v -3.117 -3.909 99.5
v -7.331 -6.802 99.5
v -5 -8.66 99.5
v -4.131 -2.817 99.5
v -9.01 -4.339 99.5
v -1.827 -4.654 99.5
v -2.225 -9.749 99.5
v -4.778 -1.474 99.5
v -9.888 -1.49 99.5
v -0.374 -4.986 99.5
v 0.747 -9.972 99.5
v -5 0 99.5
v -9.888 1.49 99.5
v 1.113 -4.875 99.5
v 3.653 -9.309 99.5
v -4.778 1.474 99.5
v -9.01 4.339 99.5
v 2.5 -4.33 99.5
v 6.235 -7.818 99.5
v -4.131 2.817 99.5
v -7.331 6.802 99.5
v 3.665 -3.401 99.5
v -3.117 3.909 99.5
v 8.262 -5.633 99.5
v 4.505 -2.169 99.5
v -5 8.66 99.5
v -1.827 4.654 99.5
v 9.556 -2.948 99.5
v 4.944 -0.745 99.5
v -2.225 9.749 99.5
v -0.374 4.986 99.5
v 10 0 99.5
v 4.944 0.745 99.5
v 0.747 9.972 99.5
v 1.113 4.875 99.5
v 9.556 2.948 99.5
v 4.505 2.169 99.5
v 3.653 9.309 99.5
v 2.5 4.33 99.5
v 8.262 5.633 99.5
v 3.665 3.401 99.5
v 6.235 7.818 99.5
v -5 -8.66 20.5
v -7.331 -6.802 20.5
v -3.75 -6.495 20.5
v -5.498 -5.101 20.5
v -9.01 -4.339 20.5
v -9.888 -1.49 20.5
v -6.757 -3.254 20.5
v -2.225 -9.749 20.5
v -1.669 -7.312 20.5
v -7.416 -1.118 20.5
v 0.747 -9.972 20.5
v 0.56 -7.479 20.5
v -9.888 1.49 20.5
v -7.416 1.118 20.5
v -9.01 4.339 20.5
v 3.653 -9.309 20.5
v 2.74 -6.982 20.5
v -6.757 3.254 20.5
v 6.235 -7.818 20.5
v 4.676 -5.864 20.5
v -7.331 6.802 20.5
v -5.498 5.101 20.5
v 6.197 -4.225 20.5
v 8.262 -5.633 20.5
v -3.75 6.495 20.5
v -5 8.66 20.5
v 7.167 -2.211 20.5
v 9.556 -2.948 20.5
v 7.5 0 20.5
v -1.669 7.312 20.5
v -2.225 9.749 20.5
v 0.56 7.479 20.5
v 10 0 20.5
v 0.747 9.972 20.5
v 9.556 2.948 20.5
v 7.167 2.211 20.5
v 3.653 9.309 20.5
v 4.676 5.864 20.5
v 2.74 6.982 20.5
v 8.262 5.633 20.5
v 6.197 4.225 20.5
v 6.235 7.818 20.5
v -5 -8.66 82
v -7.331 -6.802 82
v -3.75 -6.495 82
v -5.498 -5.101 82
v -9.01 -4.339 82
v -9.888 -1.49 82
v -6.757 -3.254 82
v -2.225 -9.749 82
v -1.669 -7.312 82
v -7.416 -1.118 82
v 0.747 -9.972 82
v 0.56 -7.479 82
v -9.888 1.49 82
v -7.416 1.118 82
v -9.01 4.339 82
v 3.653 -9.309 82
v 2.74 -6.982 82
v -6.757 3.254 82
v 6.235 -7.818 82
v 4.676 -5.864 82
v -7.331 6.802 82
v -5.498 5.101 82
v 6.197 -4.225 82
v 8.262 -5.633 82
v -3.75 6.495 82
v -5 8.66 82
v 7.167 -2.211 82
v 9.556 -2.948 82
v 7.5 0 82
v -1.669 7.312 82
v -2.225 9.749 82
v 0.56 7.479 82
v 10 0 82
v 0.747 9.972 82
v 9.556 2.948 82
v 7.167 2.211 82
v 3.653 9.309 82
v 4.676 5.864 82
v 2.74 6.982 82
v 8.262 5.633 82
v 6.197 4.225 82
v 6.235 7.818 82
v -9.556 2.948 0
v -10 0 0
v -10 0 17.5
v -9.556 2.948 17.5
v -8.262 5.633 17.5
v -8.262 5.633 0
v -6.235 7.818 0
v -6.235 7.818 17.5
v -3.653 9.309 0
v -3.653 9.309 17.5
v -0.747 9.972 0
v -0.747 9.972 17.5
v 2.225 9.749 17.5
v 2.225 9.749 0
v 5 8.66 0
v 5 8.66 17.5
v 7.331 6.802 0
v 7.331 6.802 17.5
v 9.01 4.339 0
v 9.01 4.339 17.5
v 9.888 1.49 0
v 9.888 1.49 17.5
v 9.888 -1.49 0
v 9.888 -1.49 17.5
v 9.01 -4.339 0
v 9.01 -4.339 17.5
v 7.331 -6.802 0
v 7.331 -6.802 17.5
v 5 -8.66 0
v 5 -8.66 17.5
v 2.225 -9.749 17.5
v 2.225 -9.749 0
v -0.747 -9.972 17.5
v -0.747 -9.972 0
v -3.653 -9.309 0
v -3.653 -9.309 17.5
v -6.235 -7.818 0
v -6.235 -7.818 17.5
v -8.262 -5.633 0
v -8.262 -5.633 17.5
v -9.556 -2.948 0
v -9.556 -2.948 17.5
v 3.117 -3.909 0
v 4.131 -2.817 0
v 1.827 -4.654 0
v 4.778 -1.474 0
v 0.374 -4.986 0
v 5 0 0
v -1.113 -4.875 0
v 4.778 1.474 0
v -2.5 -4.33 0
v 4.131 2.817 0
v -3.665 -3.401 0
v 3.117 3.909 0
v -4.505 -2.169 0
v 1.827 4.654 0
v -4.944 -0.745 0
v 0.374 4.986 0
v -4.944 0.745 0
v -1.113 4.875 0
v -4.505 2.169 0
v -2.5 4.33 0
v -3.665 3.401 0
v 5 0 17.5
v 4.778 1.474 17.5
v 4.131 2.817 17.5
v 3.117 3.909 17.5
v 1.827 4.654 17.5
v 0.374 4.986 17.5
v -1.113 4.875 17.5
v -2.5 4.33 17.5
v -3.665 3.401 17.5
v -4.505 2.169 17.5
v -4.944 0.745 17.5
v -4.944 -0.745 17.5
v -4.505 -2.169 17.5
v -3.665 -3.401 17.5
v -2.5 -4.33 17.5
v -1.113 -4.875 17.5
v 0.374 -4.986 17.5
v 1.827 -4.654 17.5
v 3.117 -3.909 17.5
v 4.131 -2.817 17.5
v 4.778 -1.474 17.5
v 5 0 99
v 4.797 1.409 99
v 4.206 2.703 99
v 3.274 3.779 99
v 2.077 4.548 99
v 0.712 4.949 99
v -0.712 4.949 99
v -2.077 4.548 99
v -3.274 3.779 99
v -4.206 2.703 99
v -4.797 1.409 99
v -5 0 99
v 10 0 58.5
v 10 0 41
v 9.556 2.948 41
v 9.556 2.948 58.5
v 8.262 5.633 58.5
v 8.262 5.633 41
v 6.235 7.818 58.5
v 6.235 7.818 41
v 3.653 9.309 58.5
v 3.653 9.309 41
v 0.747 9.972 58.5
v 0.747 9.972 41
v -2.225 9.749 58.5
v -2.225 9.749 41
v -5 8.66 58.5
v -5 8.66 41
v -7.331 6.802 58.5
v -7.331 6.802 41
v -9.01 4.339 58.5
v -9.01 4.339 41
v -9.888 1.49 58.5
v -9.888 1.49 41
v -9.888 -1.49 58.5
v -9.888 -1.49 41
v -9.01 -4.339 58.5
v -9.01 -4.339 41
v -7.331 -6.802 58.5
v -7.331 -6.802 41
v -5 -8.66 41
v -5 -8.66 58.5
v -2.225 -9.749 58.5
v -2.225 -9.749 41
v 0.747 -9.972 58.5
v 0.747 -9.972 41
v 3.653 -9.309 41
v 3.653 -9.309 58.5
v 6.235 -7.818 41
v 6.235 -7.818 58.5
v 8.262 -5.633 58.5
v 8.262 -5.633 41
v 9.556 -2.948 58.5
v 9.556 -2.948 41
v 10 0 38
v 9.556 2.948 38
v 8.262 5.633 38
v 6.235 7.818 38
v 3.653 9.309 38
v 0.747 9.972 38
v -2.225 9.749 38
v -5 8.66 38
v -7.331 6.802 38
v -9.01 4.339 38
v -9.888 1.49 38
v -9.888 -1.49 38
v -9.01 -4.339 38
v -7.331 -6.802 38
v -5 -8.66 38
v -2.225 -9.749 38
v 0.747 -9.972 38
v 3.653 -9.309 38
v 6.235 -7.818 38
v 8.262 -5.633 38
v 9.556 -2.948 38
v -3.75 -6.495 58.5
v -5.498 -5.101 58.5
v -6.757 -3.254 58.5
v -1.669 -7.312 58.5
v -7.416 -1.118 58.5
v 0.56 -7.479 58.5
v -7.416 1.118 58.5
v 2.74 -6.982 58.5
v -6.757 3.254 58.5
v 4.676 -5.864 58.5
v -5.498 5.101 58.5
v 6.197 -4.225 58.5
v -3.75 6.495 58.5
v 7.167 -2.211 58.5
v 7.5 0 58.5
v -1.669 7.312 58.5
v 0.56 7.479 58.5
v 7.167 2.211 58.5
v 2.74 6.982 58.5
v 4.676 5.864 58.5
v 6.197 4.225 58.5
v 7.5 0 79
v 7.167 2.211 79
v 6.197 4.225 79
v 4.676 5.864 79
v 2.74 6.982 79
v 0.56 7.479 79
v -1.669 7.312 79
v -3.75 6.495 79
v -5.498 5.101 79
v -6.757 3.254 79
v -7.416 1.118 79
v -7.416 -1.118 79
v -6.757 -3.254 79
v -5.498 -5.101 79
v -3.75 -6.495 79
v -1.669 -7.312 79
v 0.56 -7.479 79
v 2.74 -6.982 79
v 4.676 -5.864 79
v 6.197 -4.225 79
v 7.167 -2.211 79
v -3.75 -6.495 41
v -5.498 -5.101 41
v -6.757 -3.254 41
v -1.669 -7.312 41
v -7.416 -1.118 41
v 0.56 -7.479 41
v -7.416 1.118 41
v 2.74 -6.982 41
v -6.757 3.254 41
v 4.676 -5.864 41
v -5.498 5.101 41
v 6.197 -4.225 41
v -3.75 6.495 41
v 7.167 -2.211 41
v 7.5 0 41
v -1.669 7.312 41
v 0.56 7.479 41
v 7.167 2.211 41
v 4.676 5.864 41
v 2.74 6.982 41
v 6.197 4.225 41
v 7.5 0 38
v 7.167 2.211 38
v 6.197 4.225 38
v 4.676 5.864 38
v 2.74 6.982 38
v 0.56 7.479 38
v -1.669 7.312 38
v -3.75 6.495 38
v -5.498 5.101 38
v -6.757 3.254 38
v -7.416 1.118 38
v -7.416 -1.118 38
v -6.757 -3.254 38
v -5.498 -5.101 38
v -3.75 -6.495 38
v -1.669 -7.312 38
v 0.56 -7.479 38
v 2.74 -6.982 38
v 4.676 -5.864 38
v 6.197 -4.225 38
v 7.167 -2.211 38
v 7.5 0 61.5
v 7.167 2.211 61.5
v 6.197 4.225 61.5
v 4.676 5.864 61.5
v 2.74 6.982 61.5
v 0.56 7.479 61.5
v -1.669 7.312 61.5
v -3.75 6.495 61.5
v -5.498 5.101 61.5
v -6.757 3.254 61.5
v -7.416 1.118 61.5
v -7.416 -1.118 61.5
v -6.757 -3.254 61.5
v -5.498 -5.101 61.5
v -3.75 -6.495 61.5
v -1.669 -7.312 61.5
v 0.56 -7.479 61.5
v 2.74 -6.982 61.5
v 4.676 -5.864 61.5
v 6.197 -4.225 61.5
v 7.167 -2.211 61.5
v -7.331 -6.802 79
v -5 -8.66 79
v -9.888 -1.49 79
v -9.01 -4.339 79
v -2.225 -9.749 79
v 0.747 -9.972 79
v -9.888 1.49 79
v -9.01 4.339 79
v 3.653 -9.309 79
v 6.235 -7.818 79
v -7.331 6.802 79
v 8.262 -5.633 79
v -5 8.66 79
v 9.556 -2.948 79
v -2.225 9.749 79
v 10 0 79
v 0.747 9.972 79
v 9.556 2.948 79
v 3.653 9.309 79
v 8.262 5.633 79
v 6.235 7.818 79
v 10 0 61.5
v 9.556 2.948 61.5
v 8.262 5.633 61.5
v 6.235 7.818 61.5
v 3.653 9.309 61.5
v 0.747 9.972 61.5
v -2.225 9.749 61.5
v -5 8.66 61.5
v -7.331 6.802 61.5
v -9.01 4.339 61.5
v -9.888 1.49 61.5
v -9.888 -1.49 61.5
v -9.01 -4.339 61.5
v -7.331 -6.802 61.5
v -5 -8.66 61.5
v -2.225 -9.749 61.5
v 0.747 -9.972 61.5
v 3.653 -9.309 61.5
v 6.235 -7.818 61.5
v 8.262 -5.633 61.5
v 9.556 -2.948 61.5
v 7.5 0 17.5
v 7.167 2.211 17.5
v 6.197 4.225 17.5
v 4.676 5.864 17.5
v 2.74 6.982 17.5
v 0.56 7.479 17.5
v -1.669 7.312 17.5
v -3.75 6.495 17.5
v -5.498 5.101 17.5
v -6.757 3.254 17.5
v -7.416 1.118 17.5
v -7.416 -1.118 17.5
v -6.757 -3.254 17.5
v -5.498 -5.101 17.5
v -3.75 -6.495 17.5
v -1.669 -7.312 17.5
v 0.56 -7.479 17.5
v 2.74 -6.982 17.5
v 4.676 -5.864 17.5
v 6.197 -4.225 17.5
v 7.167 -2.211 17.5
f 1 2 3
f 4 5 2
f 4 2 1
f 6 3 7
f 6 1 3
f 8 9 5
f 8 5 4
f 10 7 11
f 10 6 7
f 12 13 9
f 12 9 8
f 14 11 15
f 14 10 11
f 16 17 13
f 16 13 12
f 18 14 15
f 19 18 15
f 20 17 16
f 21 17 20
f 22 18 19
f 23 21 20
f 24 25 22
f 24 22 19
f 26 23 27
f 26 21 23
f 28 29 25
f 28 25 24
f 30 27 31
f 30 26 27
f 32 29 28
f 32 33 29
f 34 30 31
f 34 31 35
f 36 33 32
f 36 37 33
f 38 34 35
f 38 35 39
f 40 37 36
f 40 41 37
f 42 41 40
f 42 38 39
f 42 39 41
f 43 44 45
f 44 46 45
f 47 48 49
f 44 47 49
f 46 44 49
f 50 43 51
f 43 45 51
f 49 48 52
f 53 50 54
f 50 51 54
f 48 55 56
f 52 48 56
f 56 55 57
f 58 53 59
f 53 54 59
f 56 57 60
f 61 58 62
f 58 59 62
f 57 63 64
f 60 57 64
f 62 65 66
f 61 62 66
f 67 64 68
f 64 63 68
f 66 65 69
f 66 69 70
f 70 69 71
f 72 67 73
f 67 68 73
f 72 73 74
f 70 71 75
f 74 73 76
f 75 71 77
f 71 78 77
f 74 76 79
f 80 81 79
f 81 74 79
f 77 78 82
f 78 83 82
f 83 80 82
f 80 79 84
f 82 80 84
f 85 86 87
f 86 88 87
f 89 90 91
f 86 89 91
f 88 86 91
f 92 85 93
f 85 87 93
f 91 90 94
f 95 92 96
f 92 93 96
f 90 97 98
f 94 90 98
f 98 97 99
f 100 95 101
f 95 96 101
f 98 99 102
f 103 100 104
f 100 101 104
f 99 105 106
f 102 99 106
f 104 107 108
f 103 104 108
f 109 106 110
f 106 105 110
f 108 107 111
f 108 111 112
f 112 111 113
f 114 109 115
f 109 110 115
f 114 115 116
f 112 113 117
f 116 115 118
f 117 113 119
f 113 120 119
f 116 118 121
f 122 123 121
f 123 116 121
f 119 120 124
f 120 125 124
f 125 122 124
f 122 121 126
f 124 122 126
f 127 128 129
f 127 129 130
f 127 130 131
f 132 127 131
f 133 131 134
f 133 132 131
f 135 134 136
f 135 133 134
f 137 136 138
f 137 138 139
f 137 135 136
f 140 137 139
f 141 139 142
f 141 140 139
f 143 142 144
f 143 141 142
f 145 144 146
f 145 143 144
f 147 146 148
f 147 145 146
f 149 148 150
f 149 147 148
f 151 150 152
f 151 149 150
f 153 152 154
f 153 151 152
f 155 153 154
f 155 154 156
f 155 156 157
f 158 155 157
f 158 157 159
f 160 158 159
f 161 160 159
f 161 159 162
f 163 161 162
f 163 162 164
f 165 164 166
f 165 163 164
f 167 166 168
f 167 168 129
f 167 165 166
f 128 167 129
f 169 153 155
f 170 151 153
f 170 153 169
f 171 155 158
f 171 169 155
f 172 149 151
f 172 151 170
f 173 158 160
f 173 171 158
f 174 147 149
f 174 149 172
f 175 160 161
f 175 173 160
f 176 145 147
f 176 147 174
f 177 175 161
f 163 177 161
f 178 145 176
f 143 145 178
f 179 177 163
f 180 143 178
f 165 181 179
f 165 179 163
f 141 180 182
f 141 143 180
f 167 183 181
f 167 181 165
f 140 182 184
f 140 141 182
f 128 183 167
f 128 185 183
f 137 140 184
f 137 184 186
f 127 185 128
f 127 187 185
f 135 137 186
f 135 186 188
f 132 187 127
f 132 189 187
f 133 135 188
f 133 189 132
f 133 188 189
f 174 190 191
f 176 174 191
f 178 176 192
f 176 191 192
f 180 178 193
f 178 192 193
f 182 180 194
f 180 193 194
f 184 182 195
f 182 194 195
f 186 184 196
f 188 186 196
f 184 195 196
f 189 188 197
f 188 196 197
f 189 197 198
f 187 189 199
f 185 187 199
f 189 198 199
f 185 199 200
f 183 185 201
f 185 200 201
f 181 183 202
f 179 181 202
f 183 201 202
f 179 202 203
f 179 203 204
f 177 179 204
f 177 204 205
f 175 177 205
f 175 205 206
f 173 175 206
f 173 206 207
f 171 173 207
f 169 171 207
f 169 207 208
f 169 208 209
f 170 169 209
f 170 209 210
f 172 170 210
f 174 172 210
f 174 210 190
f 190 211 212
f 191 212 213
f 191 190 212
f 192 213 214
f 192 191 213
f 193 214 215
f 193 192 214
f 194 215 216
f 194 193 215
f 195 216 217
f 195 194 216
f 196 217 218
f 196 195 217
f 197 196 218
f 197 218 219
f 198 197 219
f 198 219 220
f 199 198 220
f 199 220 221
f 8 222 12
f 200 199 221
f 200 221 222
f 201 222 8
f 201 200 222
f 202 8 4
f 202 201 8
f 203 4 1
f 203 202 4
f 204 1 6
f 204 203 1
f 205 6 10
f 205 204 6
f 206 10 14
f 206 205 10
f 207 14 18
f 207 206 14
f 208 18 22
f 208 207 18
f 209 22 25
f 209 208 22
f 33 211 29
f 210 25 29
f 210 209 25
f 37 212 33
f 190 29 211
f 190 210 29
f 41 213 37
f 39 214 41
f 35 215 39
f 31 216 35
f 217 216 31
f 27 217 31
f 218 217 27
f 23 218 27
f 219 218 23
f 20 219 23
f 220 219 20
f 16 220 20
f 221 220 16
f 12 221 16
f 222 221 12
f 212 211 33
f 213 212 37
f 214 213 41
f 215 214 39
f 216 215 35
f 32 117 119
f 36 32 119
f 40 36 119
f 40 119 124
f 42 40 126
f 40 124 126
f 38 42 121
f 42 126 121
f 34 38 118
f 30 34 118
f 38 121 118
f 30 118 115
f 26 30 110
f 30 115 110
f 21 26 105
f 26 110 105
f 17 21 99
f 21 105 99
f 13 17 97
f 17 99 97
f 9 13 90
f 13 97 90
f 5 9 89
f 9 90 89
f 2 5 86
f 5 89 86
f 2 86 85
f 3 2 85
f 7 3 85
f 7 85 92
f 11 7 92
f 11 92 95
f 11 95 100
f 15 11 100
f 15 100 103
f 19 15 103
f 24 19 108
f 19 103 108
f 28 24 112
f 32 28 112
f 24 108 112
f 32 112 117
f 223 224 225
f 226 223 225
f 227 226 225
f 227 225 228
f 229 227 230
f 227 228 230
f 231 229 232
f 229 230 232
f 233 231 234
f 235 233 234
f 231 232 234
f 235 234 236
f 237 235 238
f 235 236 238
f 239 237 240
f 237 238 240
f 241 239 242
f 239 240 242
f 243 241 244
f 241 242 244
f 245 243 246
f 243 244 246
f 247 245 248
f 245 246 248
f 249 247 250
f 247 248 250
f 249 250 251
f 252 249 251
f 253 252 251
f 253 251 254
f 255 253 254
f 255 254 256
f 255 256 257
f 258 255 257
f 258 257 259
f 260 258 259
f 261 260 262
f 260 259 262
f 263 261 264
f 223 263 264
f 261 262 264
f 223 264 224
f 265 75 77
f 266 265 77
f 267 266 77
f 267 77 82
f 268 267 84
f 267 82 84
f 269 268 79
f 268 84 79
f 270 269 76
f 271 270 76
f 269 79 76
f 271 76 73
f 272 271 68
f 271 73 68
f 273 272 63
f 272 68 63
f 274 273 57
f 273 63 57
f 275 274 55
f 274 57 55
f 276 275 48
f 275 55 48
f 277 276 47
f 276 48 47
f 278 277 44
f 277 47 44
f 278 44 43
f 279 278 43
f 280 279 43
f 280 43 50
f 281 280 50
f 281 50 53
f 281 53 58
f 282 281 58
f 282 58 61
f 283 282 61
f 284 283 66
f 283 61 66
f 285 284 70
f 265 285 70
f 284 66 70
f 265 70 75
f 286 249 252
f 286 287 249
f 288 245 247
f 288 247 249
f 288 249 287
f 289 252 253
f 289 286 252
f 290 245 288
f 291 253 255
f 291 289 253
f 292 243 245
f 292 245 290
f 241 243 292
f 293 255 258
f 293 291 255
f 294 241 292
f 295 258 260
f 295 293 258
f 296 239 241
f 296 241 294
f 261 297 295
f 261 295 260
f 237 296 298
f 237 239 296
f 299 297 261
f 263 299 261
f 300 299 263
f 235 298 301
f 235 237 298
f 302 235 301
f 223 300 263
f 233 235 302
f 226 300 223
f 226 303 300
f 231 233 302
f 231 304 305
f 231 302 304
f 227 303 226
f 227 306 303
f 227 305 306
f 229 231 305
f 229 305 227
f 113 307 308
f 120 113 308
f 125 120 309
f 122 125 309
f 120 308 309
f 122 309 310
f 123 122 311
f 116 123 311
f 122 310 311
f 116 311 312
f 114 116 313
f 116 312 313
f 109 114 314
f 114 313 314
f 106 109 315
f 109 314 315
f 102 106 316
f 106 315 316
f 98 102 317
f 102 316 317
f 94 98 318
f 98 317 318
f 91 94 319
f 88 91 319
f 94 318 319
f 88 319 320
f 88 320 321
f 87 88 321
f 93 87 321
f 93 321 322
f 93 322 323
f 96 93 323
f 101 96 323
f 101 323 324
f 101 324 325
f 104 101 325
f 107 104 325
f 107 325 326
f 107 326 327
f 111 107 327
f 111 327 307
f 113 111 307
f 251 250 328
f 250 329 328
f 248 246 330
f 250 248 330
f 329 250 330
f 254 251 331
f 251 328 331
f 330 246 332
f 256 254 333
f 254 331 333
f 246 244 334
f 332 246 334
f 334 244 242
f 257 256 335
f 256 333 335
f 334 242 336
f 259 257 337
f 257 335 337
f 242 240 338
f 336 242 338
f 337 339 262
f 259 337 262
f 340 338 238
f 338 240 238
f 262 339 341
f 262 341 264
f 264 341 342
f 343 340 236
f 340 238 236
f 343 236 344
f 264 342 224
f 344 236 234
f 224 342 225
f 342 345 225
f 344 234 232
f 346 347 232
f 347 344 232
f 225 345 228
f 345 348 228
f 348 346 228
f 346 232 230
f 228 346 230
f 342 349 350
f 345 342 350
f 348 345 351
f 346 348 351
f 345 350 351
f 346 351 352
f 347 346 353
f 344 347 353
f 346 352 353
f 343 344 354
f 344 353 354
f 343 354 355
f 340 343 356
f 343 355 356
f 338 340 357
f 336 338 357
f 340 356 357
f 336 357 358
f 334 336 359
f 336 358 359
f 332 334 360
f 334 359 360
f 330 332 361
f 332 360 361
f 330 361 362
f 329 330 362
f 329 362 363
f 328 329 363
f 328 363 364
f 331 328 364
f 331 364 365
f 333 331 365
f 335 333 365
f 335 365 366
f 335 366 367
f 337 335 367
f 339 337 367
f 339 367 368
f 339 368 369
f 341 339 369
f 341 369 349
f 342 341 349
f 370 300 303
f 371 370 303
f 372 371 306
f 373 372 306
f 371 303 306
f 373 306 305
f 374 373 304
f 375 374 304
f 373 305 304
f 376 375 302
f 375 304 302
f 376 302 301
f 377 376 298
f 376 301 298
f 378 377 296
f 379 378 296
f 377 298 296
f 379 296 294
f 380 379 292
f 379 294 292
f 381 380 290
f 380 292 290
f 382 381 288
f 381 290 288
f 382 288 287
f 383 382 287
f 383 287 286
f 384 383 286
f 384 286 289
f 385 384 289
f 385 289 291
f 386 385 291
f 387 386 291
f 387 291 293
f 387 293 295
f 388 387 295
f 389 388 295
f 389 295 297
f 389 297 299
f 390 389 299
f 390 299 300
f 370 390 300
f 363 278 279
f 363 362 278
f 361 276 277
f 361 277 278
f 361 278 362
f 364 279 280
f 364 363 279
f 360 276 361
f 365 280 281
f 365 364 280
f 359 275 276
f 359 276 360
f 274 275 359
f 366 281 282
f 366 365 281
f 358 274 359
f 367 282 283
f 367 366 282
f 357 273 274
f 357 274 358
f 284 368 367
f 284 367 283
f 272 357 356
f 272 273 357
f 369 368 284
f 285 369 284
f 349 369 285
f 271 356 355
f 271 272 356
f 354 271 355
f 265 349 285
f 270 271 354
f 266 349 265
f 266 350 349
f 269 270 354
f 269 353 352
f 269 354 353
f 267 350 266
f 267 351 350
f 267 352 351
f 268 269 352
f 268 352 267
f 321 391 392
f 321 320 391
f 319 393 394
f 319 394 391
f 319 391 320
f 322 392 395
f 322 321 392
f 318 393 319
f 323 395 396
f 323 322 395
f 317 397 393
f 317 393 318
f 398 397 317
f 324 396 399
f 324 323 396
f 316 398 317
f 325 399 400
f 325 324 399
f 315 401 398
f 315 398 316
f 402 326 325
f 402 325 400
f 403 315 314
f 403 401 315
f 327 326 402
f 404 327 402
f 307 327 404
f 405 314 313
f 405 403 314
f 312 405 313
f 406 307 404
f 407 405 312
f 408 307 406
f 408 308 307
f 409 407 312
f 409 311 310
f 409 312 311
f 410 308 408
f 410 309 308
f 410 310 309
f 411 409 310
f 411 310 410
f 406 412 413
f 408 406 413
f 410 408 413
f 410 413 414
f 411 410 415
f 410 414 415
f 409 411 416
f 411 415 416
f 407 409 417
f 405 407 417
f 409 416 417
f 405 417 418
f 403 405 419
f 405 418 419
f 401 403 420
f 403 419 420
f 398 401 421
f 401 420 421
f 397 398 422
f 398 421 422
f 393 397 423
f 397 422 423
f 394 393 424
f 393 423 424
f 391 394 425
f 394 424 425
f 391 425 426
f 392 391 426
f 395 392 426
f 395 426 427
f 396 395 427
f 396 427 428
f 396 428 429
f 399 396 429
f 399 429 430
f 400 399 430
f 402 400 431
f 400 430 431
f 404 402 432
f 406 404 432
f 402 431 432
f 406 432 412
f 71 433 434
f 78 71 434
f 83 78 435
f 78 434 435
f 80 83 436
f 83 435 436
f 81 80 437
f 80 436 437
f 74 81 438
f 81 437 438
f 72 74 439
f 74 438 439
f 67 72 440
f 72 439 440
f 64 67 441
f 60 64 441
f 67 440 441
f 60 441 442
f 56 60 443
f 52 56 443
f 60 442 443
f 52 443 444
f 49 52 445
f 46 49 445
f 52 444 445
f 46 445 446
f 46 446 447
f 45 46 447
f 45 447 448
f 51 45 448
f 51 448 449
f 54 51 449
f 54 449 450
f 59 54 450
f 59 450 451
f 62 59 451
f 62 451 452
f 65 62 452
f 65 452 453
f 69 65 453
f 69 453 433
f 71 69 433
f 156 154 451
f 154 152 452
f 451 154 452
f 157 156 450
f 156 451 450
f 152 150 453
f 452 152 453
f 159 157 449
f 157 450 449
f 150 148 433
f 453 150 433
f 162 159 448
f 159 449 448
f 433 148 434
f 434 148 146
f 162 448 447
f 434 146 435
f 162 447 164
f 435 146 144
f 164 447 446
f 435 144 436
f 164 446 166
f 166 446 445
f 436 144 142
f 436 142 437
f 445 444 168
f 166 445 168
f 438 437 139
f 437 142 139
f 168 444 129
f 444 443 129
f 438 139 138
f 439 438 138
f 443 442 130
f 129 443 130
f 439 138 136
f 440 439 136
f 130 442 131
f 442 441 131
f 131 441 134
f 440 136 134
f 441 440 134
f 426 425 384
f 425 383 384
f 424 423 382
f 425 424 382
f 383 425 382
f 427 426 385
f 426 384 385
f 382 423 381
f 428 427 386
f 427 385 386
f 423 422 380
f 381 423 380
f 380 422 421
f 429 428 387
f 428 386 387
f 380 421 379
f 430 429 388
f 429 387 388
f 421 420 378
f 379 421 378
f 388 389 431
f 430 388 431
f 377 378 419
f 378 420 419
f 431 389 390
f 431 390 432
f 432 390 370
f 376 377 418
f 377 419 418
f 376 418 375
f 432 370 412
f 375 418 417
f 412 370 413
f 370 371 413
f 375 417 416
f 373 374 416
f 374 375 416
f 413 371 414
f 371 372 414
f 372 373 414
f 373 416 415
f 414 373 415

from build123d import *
from build123d.topology import SkipClean

# Parameters (mm, degrees)
SKETCH1_R           = 7.5
SKETCH1_R_2         = 5
BOSS_EXTRUDE1_DEPTH = 99
SKETCH2_R           = 10
BOSS_EXTRUDE2_DEPTH = 17.5
SKETCH3_R           = 10
SKETCH3_R_2         = 7.5
BOSS_EXTRUDE3_DEPTH = 17.5
SKETCH4_R           = 10
SKETCH4_R_2         = 7.5
BOSS_EXTRUDE4_DEPTH = 17.5
SKETCH5_R           = 10
SKETCH5_R_2         = 7.5
BOSS_EXTRUDE5_DEPTH = 17.5
SKETCH6_R           = 10
SKETCH6_R_2         = 7.5
BOSS_EXTRUDE6_DEPTH = 17.5
SKETCH9_R           = 7.5
SKETCH9_R_2         = 5
BOSS_EXTRUDE7_DEPTH = 0.5
SKETCH10_R          = 5
CUT_EXTRUDE1_DEPTH  = 84.210576251


with BuildPart() as part:
    # Sketch1 → Boss-Extrude1 (new body)
    with BuildSketch(Plane.XY):
        Circle(SKETCH1_R)
        Circle(SKETCH1_R_2, mode=Mode.SUBTRACT)
    extrude(amount=BOSS_EXTRUDE1_DEPTH)

    # Sketch2 → Boss-Extrude2 (add)
    with BuildSketch(Plane(origin=(0, 0, 0), x_dir=(-1, 0, 0), z_dir=(0, 0, -1))):
        Circle(SKETCH2_R)
    extrude(amount=-BOSS_EXTRUDE2_DEPTH)

    # Sketch3 → Boss-Extrude3 (add)
    with BuildSketch(Plane.XY.offset(20.5)):
        Circle(SKETCH3_R)
        Circle(SKETCH3_R_2, mode=Mode.SUBTRACT)
    extrude(amount=BOSS_EXTRUDE3_DEPTH)

    # Sketch4 → Boss-Extrude4 (add)
    with BuildSketch(Plane.XY.offset(41)):
        Circle(SKETCH4_R)
        Circle(SKETCH4_R_2, mode=Mode.SUBTRACT)
    extrude(amount=BOSS_EXTRUDE4_DEPTH)

    # Sketch5 → Boss-Extrude5 (add)
    with BuildSketch(Plane.XY.offset(61.5)):
        Circle(SKETCH5_R)
        Circle(SKETCH5_R_2, mode=Mode.SUBTRACT)
    extrude(amount=BOSS_EXTRUDE5_DEPTH)

    # Sketch6 → Boss-Extrude6 (add)
    with BuildSketch(Plane.XY.offset(82)):
        Circle(SKETCH6_R)
        Circle(SKETCH6_R_2, mode=Mode.SUBTRACT)
    extrude(amount=BOSS_EXTRUDE6_DEPTH)

    # Sketch9 → Boss-Extrude7 (add)
    with BuildSketch(Plane.XY.offset(99)):
        Circle(SKETCH9_R)
        with Locations(Location((0, 0, 0), (0, 0, 180))):
            Circle(SKETCH9_R_2, mode=Mode.SUBTRACT)
    extrude(amount=BOSS_EXTRUDE7_DEPTH)

    # Sketch10 → Cut-Extrude1 (cut, through all)
    with SkipClean():  # the faces are left unmerged after this step: merging them gives an invalid solid
        with BuildSketch(Plane.XY.offset(17.5)):
            Circle(SKETCH10_R)
        extrude(amount=-CUT_EXTRUDE1_DEPTH, mode=Mode.SUBTRACT)
    add(part.part.scale(1), mode=Mode.REPLACE)  # the faces are merged on a copy


solid = part.part
